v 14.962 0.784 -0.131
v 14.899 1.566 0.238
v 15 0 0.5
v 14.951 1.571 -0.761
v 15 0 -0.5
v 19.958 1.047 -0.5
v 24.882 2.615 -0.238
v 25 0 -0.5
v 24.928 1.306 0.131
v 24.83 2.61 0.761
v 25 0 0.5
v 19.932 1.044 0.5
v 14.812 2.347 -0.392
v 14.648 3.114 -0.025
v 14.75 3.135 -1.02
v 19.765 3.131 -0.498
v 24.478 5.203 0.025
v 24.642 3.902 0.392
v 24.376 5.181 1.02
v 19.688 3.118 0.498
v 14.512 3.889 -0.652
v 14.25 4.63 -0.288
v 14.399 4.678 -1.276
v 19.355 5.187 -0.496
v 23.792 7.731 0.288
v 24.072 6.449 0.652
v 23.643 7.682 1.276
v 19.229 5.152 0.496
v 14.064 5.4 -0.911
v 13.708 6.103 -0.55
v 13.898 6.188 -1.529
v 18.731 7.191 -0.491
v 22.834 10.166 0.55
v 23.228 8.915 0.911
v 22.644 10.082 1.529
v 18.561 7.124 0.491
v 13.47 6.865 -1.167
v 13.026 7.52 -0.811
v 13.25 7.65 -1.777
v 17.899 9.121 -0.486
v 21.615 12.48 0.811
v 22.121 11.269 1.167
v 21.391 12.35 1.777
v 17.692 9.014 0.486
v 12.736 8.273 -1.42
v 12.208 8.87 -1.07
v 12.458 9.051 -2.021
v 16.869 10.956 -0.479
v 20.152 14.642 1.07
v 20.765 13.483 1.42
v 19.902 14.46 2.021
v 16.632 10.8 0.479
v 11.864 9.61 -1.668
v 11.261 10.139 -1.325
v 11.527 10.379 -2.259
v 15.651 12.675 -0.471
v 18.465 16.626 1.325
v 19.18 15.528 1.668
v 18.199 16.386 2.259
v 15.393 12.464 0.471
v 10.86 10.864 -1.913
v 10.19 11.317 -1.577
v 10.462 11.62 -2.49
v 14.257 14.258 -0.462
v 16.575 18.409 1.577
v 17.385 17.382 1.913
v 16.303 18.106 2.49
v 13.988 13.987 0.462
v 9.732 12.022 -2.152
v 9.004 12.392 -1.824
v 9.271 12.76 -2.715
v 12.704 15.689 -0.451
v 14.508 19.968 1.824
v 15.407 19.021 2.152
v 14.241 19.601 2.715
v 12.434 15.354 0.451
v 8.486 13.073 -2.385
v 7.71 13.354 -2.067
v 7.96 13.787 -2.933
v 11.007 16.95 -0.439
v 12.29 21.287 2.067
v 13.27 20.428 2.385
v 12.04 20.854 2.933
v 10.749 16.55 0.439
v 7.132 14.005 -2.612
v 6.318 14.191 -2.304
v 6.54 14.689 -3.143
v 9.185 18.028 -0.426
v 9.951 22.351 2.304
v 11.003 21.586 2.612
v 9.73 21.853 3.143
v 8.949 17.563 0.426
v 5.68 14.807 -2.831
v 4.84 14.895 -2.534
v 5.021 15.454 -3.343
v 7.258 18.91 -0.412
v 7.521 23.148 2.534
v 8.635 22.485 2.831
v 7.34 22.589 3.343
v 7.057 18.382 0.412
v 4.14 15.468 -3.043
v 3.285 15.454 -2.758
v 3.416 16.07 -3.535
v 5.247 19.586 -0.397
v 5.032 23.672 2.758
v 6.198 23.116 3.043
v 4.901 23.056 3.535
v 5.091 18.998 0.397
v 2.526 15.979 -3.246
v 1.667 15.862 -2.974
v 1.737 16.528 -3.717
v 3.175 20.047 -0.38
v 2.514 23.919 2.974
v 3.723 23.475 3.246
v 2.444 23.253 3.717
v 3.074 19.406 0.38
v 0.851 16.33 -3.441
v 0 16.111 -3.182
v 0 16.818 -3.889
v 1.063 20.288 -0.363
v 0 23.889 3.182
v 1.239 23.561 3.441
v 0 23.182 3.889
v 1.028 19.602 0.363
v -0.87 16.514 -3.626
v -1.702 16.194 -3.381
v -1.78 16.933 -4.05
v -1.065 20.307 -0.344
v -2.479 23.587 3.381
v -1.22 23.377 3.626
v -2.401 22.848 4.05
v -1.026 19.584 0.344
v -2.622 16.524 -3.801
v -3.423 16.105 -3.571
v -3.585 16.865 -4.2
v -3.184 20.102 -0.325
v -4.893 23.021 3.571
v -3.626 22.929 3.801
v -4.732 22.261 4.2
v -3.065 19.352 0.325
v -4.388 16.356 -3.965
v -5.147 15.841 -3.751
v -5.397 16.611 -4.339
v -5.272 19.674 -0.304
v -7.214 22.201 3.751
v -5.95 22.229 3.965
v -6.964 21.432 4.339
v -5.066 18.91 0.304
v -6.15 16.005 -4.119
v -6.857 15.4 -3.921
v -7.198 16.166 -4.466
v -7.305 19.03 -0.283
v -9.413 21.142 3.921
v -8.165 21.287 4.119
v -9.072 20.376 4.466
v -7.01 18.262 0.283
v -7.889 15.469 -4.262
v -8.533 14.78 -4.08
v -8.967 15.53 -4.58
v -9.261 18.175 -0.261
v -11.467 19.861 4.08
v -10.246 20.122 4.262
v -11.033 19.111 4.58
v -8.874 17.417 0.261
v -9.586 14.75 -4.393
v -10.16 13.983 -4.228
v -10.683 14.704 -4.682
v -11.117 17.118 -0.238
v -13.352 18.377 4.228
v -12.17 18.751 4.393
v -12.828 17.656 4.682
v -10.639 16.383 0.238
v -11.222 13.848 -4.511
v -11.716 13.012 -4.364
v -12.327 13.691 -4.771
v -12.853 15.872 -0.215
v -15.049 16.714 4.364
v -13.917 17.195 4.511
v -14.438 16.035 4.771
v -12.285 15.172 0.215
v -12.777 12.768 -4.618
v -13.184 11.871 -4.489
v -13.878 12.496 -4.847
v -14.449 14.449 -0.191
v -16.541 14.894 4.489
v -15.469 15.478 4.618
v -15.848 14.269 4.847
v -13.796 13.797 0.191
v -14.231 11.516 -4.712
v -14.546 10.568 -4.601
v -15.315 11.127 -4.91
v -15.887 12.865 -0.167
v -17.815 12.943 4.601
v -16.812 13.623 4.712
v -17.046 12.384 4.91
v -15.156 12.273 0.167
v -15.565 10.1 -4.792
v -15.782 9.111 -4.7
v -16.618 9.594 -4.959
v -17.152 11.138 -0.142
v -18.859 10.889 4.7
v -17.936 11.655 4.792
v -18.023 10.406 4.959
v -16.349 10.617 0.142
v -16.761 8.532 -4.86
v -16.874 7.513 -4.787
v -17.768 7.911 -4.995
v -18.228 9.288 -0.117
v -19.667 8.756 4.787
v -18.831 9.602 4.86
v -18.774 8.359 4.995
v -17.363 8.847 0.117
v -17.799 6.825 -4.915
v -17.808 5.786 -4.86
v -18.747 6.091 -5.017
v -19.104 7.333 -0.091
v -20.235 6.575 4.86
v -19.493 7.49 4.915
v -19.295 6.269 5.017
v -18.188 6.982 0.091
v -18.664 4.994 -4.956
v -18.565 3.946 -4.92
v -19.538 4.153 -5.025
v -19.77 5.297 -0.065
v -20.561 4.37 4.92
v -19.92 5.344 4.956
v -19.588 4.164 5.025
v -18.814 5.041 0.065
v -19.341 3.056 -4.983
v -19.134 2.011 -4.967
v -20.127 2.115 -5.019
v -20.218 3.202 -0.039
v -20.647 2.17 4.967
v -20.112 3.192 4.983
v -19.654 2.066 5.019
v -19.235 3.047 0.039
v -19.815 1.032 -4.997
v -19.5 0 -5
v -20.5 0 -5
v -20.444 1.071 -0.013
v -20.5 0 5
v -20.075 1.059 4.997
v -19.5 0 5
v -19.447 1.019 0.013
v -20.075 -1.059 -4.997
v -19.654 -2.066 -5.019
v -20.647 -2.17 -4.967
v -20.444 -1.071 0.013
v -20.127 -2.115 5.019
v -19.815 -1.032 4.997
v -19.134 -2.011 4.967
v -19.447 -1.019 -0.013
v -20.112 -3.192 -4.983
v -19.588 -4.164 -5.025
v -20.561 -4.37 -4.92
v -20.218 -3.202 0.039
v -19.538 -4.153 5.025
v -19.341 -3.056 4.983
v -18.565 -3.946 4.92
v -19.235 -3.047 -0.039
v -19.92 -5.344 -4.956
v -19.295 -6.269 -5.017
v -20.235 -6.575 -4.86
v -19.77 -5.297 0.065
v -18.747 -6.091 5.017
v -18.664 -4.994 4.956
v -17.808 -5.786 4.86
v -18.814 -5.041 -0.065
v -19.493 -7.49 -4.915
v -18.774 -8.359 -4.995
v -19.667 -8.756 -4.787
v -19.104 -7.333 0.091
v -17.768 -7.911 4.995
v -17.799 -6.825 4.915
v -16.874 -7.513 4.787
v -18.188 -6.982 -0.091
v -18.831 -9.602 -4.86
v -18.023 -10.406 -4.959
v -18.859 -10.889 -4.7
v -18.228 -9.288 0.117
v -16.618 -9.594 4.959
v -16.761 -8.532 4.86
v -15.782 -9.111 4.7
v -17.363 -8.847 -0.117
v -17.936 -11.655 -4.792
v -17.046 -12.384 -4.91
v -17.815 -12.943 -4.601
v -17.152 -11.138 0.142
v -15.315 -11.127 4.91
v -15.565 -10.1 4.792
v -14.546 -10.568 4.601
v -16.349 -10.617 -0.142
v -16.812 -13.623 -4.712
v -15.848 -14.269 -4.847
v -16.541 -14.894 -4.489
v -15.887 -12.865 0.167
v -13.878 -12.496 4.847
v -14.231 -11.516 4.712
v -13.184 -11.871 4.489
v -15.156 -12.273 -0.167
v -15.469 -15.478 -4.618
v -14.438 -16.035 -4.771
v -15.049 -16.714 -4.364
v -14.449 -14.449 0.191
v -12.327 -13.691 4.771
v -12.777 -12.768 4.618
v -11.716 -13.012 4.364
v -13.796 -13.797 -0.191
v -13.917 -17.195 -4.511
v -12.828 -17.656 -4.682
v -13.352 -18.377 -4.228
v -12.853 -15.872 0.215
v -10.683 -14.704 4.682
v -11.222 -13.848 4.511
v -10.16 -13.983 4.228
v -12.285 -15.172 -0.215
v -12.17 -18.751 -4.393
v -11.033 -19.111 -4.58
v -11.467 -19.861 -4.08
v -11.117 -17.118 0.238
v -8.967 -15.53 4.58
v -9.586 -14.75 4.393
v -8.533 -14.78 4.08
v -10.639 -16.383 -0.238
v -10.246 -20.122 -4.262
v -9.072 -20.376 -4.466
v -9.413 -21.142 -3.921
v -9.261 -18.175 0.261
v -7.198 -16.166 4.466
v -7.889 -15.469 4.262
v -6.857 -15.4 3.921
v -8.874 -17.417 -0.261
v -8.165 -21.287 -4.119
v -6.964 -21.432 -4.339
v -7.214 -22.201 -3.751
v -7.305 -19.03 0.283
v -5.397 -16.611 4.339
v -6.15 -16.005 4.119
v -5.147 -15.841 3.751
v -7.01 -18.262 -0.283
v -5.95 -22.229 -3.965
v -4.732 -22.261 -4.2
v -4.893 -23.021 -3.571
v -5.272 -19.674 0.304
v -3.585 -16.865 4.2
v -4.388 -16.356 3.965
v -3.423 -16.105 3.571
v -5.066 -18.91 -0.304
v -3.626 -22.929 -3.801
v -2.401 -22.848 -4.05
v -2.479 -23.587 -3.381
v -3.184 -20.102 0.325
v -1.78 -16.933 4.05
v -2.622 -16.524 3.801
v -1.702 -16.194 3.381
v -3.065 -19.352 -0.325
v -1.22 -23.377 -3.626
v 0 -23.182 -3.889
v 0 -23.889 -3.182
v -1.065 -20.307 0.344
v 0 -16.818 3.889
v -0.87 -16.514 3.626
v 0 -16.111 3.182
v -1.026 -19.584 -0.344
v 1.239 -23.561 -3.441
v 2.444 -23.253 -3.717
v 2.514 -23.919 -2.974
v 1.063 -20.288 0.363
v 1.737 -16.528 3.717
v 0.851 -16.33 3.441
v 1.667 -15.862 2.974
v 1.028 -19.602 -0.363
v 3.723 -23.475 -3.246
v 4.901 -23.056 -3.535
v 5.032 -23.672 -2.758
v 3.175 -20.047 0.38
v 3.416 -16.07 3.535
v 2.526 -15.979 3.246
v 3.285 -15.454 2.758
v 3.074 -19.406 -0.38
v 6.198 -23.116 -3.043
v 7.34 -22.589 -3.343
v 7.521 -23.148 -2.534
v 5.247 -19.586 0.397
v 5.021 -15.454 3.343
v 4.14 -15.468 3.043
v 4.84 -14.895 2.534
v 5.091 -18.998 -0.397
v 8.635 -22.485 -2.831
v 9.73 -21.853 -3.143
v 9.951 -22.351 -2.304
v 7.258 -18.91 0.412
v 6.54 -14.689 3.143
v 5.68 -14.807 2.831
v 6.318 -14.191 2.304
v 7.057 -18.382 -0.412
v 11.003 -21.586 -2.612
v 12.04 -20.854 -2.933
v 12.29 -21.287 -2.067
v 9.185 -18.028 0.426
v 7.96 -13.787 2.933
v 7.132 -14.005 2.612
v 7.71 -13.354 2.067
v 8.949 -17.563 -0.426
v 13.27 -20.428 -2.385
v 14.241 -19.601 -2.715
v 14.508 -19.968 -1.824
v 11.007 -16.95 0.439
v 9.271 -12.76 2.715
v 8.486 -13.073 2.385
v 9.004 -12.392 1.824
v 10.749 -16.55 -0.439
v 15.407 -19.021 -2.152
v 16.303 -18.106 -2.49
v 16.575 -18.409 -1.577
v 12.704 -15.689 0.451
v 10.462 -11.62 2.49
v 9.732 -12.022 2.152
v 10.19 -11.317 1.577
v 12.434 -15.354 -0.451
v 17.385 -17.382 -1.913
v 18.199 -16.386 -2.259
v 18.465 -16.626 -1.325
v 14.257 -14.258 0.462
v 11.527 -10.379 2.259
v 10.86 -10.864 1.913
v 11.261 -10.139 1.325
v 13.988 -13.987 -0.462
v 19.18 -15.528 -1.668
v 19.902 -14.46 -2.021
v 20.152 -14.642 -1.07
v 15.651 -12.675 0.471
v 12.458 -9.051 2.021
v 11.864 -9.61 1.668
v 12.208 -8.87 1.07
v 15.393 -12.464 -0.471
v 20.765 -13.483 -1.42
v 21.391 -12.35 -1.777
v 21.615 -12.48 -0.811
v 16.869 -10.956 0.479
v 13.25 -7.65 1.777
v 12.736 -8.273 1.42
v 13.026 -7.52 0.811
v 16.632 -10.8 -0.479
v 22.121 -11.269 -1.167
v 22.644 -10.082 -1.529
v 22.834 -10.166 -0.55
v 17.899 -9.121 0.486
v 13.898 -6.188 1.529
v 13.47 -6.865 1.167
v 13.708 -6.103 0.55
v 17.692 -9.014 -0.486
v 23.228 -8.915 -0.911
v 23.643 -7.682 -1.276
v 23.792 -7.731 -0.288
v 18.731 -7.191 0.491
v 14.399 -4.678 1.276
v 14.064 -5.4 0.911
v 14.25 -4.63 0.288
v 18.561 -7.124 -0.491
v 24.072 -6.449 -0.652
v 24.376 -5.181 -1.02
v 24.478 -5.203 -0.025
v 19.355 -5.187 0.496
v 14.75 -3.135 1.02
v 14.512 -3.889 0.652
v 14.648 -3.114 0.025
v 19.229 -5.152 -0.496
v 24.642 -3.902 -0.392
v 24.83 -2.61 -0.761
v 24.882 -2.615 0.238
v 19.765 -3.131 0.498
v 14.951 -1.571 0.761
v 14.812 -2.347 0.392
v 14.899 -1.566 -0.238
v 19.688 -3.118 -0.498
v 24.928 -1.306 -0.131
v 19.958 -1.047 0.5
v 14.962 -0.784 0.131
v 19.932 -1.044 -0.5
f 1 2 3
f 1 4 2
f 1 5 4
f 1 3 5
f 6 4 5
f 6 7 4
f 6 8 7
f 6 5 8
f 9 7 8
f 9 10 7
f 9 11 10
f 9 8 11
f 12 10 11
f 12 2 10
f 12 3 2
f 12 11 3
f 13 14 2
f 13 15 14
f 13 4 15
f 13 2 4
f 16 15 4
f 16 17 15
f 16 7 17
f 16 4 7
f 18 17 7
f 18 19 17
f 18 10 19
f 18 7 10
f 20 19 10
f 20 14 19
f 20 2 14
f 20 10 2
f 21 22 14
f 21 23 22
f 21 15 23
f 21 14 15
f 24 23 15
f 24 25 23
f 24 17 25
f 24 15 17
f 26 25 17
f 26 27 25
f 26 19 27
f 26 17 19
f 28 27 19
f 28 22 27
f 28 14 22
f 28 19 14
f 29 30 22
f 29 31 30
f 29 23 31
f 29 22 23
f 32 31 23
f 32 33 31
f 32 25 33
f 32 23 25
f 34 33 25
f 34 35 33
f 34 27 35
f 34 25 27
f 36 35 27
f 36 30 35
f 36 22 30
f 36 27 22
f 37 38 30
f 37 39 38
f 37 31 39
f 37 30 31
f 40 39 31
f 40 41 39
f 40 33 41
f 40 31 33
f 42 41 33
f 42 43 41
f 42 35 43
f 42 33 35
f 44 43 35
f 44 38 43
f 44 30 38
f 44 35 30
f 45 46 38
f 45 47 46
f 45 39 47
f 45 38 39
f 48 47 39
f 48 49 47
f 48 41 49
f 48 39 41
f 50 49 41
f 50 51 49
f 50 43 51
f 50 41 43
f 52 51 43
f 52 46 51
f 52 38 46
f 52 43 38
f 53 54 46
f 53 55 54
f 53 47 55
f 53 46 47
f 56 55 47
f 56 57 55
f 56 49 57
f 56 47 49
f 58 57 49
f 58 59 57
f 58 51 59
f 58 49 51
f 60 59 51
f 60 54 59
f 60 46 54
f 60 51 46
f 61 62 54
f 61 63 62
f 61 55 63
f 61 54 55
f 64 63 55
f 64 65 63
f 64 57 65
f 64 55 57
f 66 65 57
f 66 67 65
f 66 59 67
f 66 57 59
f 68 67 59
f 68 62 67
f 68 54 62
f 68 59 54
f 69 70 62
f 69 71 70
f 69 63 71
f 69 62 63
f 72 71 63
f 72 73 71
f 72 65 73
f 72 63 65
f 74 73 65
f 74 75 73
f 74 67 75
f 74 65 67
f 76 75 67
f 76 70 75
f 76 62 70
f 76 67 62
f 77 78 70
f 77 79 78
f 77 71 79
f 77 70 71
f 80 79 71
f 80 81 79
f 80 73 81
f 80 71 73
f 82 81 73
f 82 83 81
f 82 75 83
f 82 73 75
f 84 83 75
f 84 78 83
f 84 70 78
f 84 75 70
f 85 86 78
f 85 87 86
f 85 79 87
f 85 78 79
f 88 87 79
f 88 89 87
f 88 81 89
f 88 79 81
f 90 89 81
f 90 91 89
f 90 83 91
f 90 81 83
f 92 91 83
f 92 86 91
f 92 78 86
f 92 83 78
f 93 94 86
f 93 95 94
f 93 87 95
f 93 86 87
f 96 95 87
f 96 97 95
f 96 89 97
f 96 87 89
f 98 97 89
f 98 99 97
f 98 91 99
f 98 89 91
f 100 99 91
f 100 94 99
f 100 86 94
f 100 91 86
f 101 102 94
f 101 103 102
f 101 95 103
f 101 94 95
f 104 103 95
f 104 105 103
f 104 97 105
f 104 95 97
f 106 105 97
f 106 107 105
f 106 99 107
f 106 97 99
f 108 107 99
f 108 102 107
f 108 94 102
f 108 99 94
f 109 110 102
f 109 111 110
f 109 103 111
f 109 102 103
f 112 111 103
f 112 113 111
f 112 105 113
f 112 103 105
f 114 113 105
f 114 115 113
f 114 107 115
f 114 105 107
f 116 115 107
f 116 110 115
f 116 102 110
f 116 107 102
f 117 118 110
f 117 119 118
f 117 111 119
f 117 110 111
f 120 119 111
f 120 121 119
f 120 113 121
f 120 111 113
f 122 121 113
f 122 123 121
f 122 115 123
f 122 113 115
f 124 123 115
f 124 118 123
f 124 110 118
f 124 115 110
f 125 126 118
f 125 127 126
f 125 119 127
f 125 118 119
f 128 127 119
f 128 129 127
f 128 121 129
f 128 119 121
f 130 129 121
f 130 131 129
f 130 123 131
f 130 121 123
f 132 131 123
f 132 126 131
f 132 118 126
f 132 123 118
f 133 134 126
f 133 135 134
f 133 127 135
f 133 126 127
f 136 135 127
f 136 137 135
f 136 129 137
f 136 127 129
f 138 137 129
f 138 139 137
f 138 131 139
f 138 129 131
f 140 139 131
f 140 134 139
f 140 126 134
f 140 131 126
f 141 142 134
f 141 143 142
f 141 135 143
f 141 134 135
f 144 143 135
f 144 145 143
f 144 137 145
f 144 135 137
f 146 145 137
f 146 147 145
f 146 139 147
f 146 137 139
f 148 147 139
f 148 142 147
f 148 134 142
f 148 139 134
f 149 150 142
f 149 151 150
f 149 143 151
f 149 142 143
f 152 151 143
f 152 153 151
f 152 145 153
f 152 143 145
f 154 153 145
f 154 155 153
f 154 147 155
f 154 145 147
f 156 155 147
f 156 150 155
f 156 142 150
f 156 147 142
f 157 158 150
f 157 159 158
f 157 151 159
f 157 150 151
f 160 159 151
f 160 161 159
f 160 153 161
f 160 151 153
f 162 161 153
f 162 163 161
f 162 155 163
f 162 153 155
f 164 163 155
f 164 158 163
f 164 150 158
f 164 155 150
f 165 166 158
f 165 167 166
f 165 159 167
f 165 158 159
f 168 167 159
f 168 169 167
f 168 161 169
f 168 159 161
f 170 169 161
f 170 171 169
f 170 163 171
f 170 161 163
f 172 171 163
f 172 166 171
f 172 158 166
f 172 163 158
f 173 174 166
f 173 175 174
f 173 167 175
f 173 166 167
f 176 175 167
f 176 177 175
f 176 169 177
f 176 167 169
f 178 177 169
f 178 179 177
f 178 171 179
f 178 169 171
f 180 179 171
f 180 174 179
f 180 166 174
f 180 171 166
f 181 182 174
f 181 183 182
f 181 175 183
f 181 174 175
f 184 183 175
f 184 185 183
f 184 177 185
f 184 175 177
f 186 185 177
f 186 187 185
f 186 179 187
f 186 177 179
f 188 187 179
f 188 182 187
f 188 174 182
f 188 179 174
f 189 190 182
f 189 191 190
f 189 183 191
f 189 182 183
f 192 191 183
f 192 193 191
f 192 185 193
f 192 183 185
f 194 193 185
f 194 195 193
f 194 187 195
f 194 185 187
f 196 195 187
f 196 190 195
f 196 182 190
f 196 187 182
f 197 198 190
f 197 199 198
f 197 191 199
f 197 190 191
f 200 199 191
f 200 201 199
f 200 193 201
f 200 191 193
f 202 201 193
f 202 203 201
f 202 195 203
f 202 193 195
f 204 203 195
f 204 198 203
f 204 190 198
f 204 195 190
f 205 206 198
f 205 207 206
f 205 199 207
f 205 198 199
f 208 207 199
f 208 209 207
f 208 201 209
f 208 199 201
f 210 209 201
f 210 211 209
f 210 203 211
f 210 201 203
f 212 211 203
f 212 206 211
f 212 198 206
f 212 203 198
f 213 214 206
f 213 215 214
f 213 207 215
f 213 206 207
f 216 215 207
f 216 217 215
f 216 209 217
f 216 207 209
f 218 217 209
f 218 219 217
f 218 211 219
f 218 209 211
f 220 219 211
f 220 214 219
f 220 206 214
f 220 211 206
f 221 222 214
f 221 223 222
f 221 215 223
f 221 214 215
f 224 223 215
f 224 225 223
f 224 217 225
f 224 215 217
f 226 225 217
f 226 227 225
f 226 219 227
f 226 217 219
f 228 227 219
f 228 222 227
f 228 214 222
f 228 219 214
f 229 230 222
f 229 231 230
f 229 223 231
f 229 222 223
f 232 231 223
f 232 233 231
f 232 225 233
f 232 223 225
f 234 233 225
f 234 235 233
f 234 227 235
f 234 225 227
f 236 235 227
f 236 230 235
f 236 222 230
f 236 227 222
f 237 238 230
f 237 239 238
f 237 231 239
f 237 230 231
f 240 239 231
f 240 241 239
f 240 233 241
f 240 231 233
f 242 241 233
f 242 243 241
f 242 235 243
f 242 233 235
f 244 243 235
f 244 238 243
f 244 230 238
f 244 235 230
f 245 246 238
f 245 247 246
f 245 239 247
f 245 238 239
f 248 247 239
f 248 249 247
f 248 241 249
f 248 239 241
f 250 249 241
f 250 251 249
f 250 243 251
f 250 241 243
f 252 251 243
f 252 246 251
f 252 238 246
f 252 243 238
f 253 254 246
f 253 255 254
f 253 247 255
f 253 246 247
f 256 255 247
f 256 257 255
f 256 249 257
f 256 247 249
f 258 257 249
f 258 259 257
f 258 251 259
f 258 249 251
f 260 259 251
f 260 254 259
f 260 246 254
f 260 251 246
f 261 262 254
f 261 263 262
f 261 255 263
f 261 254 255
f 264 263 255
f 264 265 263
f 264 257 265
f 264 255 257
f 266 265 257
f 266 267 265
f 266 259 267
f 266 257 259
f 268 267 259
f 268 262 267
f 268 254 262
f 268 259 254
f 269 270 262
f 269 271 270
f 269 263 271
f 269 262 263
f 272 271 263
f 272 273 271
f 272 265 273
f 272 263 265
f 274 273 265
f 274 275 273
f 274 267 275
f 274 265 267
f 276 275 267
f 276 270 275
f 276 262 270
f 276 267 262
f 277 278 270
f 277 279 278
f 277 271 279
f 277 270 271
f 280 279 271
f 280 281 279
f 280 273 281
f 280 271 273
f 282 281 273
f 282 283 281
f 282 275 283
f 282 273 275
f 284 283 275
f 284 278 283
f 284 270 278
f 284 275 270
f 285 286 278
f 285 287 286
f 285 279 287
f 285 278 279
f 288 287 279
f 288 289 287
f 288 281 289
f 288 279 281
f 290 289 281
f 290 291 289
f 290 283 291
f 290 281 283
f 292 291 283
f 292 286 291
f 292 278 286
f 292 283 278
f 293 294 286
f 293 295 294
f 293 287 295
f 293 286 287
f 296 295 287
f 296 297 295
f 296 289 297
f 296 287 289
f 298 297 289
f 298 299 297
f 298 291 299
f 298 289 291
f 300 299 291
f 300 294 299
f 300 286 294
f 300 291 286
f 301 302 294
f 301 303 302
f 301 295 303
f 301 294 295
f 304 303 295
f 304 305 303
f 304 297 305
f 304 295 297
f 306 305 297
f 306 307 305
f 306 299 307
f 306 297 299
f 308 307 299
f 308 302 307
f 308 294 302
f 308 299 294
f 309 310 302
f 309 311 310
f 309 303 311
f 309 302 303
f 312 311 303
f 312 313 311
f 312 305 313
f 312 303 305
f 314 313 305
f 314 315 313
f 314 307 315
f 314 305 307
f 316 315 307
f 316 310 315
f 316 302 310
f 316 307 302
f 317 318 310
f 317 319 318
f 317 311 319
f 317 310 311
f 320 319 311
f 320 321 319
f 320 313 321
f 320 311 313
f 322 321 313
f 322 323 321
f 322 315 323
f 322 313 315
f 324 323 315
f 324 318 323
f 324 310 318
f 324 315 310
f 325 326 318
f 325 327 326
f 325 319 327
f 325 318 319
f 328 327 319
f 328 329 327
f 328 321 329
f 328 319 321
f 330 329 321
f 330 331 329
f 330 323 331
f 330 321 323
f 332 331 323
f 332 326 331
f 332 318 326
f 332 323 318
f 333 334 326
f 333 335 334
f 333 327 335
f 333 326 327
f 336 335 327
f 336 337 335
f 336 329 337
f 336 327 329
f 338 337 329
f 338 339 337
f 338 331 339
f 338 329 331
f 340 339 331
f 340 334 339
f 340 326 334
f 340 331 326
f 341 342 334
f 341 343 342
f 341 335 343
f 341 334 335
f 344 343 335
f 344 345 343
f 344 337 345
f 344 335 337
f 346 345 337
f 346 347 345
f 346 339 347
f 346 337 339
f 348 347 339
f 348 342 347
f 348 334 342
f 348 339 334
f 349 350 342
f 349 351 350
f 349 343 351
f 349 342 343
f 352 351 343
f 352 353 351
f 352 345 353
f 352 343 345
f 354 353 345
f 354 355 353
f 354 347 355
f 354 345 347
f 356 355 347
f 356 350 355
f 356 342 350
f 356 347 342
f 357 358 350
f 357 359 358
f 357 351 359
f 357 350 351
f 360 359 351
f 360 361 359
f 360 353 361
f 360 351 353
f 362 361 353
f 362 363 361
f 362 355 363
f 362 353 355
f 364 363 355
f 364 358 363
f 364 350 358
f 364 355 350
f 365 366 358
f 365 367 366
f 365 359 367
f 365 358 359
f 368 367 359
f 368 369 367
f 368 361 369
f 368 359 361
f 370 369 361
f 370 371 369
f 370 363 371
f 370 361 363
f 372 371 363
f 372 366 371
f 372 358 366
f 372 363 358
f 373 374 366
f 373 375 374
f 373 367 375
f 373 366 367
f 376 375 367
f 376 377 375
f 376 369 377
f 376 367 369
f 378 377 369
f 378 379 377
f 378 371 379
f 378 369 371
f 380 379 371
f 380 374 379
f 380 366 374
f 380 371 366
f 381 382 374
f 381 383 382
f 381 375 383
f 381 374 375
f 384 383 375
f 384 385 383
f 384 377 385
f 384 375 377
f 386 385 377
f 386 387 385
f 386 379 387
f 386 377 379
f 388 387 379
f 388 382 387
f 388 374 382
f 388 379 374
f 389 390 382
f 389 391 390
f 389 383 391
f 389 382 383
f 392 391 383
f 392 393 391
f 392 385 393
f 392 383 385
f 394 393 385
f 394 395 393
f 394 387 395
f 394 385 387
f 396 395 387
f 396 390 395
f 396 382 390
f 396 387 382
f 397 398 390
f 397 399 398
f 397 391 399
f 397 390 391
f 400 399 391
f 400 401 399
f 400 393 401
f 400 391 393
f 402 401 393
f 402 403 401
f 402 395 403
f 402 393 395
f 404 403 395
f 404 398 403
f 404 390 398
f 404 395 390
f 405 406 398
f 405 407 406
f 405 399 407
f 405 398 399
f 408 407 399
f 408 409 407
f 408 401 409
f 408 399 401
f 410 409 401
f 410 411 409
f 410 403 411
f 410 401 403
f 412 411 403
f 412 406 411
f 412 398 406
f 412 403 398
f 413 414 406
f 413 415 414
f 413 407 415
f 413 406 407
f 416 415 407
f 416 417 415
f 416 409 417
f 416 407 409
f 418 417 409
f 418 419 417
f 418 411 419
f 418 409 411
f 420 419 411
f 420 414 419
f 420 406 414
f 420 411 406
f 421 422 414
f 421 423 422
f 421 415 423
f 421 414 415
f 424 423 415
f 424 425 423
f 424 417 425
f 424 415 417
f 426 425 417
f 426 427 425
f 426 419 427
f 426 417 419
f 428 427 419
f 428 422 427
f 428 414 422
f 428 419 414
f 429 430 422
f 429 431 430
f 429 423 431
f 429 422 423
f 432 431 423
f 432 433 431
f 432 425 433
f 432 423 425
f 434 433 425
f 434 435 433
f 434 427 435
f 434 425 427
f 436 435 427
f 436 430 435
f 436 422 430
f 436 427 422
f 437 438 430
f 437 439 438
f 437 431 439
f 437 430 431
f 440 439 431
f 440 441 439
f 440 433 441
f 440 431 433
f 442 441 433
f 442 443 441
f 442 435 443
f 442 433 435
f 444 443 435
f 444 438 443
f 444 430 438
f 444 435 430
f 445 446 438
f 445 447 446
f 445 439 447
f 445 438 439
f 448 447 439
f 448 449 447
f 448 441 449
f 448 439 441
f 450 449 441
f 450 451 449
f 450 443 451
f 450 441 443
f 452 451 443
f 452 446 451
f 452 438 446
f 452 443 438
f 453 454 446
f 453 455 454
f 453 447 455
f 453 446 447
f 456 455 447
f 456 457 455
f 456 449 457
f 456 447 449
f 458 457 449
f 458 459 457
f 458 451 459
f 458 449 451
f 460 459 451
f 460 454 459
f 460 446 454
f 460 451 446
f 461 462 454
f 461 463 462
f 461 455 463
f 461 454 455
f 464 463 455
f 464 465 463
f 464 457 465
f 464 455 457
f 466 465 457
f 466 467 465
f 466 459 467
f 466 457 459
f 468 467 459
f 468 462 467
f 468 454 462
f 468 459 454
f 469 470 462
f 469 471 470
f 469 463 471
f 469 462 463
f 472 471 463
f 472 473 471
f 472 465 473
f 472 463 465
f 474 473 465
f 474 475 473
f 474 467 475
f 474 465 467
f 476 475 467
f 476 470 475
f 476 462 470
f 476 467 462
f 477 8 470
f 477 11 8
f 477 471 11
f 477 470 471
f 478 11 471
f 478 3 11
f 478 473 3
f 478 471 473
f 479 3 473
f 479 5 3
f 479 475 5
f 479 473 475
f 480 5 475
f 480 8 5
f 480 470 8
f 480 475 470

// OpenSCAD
// file: ../pcurve.scad
// Parametrize a star-convex curve by t=theta/360.
// The first point in the polygon becomes t=0.
function polar_parametrize(points,center=[0,0]) =
	let (p0=points[0], a0=atan2(p0[1]-center[1],p0[0]-center[0]))
	[ for (p=concat(points,[p0]))
	[ (atan2(p[1]-center[1],p[0]-center[0])-a0+720)%360/360, p ] ];

// Measure [partial] perimeter of polygon, through first n edges.
function perimeter(points,n=undef) =
	is_undef(n) ? perimeter(points,len(points)) :
	n==0 ? 0 :
	perimeter(points,n-1) + norm(points[n==len(points)?0:n]-points[n-1]);

// Parametrize an arbitrary curve by fraction of perimeter.
function length_parametrize(points) =
	let (total=perimeter(points)) [
	for (i=[0:1:len(points)-1]) [ perimeter(points,i)/total, points[i] ],
	[1, points[0]]];

// Parametrize an arbitrary curve by point index.
function indexed_parametrize(points,center=[0,0]) = [
	for (i=[0:1:len(points)-1]) [ i/len(points), points[i] ] ];

// Transform a parametrized curve in 2- or 3-space via an affine transformation
// matrix. Produces a parametrized curve in 3-space.
function transform_curve(M,c) = [ for (p=c) [ p[0],
	[[1,0,0,0],[0,1,0,0],[0,0,1,0]]*M*[p[1][0],p[1][1],is_undef(p[1][2])?0:p[1][2],1]
	] ];

// Produce a non-parametrized regular n-gon with first vertex on y axis.
function regular_ngon(n,r) = [ for (i=[0:1:n-1]) [-r*sin(360*i/n),r*cos(360*i/n),0] ];


// Matrix for rotation around an axis. Default is z-axis. If first argument
// is a vector, elements are sequential rotations around each axis.
function R(a,v=[0,0,1]) =
	!is_num(a) ? R(a[0],[1,0,0])*R(a[1],[0,1,0])*R(a[2],[0,0,1]) :
	let (id=[[1,0,0,0],[0,1,0,0],[0,0,1,0],[0,0,0,1]],
	vcross=[[0,-v[2],v[1],0],[v[2],0,-v[0],0],[-v[1],v[0],0,0], [0,0,0,0]],
	vouter=[for (i=[0:2]) [for (j=[0:2]) v[i]*v[j],0], [0,0,0,1]])
	cos(a)*id + sin(a)*vcross + (1-cos(a))*vouter;

// Matrix for translation. Scalars are along the z axis.
function T(v=[0,0,0]) = is_num(v) ? T([0,0,v]) :
	[[1,0,0,v[0]],[0,1,0,v[1]],[0,0,1,v[2]],[0,0,0,1]];

// Matrix for scaling (dilation). Scalar applies same to each axis;
// vector scales each axis separately.
function S(k=1) = is_num(k) ? S([k,k,k]) :
	[[k[0],0,0,0],[0,k[1],0,0],[0,0,k[2],0],[0,0,0,1]];
// file: ../loft.scad
// Sort a list of numbers.
function qsort(l) = len(l)<=1 ? l : concat(
	qsort([ for (x=l) if (x<l[0]) x ]),
	[ for (x=l) if (x==l[0]) x ],
	qsort([ for (x=l) if (x>l[0]) x]));

// Collapse runs of duplicates from a list.
function uniq(l) = [ l[0], for (i=[1:1:len(l)-1]) if (l[i]!=l[i-1]) l[i] ];

// Project on the i'th axis so lookup() can be used.
function curve_prj(c,i) = [ for (v=c) [v[0],v[1][i]] ];

// Establish periodicity of lookup() by extending to <=0 and >=1 as needed.
function curve_extend(c) = [
	if (c[0][0]>0) [c[len(c)-1][0]-1,c[len(c)-1][1]],
	for (p=c) p,
	if (c[len(c)-1][0]<1) [c[0][0]+1,c[0][1]] ];

// Evaluate curve at parameter t using lookup() to interpolate.
function curve_pt(c,t) = let(
	a=curve_extend(c))
	[ lookup(t,curve_prj(a,0)), lookup(t,curve_prj(a,1)), lookup(t,curve_prj(a,2)) ];

// Interpolate parametric curves to produce a new parametric curve.
function curve_morph(c1,c2,s) =
	let(partition = uniq(qsort([ 0, for (c=[c1,c2], p=c) p[0], 1 ])))
	[ for (t=partition) [ t,(1-s)*curve_pt(c1,t) + s*curve_pt(c2,t) ] ];

// Internal core function for loft operation.
module loft_core(curves,cap_start=false,cap_end=false) {
	partition = uniq(qsort([ for (c=curves, v=c) v[0], 1 ]));
	m = len(curves);
	n = len(partition);
	edge_points = [ for (c=curves, t=partition) curve_pt(c,t) ];
	center_points = [ for (k=[0:len(curves)-1], j=[0:1:n-2])
		(edge_points[n*k+j] + edge_points[n*(k+1)+j+1] +
		 edge_points[n*(k+1)+j] + edge_points[n*k+j+1])/4 ];
	points = [ for (p=edge_points) p, for (p=center_points) p ];
	c0 = len(edge_points);
	faces = [
		for (k=[0:1:len(curves)-2], j=[0:n-2],
			v=[ [k*n+j, (k+1)*n+j, c0+k*(n-1)+j],
			    [(k+1)*n+j, (k+1)*n+j+1, c0+k*(n-1)+j],
			    [(k+1)*n+j+1, k*n+j+1, c0+k*(n-1)+j],
			    [k*n+j+1, k*n+j, c0+k*(n-1)+j] ]) v,
		if (cap_start) [ for (j=[n-2:-1:0]) j ],
		if (cap_end) [ for (j=[0:1:n-2]) n*(m-1)+j ],
	];
	polyhedron(points=points,faces=faces,convexity=20);
}

// Produce a polyhedron-type object by applying a loft operation to
// a list of parametric curves, linking points in successive curves with
// the same value of the parameter. If the first or last curve is planar,
// it can be made into an end-cap surface by putting an empty curve []
// before or after it. Otherwise, either the first and last curves must
// be the same, producing a loop, or they must be degenerate (single points).
module loft(curves) {
	loft_core(
		curves = [for (c=curves) if (len(c)>0) c],
		cap_start = len(curves[0])==0,
		cap_end = len(curves[len(curves)-1])==0
	);
}
// main file
use <../loft.scad>;
use <../pcurve.scad>;

loft([
	for (i=[0:6:360])
		transform_curve(
			R(i)*T([20,0,0])*R(90,[1,0,0])*R(i/2)*S([1,1/10,1])*R(45),
			length_parametrize(regular_ngon(n=4,r=10/sqrt(2)))
		)
]);
